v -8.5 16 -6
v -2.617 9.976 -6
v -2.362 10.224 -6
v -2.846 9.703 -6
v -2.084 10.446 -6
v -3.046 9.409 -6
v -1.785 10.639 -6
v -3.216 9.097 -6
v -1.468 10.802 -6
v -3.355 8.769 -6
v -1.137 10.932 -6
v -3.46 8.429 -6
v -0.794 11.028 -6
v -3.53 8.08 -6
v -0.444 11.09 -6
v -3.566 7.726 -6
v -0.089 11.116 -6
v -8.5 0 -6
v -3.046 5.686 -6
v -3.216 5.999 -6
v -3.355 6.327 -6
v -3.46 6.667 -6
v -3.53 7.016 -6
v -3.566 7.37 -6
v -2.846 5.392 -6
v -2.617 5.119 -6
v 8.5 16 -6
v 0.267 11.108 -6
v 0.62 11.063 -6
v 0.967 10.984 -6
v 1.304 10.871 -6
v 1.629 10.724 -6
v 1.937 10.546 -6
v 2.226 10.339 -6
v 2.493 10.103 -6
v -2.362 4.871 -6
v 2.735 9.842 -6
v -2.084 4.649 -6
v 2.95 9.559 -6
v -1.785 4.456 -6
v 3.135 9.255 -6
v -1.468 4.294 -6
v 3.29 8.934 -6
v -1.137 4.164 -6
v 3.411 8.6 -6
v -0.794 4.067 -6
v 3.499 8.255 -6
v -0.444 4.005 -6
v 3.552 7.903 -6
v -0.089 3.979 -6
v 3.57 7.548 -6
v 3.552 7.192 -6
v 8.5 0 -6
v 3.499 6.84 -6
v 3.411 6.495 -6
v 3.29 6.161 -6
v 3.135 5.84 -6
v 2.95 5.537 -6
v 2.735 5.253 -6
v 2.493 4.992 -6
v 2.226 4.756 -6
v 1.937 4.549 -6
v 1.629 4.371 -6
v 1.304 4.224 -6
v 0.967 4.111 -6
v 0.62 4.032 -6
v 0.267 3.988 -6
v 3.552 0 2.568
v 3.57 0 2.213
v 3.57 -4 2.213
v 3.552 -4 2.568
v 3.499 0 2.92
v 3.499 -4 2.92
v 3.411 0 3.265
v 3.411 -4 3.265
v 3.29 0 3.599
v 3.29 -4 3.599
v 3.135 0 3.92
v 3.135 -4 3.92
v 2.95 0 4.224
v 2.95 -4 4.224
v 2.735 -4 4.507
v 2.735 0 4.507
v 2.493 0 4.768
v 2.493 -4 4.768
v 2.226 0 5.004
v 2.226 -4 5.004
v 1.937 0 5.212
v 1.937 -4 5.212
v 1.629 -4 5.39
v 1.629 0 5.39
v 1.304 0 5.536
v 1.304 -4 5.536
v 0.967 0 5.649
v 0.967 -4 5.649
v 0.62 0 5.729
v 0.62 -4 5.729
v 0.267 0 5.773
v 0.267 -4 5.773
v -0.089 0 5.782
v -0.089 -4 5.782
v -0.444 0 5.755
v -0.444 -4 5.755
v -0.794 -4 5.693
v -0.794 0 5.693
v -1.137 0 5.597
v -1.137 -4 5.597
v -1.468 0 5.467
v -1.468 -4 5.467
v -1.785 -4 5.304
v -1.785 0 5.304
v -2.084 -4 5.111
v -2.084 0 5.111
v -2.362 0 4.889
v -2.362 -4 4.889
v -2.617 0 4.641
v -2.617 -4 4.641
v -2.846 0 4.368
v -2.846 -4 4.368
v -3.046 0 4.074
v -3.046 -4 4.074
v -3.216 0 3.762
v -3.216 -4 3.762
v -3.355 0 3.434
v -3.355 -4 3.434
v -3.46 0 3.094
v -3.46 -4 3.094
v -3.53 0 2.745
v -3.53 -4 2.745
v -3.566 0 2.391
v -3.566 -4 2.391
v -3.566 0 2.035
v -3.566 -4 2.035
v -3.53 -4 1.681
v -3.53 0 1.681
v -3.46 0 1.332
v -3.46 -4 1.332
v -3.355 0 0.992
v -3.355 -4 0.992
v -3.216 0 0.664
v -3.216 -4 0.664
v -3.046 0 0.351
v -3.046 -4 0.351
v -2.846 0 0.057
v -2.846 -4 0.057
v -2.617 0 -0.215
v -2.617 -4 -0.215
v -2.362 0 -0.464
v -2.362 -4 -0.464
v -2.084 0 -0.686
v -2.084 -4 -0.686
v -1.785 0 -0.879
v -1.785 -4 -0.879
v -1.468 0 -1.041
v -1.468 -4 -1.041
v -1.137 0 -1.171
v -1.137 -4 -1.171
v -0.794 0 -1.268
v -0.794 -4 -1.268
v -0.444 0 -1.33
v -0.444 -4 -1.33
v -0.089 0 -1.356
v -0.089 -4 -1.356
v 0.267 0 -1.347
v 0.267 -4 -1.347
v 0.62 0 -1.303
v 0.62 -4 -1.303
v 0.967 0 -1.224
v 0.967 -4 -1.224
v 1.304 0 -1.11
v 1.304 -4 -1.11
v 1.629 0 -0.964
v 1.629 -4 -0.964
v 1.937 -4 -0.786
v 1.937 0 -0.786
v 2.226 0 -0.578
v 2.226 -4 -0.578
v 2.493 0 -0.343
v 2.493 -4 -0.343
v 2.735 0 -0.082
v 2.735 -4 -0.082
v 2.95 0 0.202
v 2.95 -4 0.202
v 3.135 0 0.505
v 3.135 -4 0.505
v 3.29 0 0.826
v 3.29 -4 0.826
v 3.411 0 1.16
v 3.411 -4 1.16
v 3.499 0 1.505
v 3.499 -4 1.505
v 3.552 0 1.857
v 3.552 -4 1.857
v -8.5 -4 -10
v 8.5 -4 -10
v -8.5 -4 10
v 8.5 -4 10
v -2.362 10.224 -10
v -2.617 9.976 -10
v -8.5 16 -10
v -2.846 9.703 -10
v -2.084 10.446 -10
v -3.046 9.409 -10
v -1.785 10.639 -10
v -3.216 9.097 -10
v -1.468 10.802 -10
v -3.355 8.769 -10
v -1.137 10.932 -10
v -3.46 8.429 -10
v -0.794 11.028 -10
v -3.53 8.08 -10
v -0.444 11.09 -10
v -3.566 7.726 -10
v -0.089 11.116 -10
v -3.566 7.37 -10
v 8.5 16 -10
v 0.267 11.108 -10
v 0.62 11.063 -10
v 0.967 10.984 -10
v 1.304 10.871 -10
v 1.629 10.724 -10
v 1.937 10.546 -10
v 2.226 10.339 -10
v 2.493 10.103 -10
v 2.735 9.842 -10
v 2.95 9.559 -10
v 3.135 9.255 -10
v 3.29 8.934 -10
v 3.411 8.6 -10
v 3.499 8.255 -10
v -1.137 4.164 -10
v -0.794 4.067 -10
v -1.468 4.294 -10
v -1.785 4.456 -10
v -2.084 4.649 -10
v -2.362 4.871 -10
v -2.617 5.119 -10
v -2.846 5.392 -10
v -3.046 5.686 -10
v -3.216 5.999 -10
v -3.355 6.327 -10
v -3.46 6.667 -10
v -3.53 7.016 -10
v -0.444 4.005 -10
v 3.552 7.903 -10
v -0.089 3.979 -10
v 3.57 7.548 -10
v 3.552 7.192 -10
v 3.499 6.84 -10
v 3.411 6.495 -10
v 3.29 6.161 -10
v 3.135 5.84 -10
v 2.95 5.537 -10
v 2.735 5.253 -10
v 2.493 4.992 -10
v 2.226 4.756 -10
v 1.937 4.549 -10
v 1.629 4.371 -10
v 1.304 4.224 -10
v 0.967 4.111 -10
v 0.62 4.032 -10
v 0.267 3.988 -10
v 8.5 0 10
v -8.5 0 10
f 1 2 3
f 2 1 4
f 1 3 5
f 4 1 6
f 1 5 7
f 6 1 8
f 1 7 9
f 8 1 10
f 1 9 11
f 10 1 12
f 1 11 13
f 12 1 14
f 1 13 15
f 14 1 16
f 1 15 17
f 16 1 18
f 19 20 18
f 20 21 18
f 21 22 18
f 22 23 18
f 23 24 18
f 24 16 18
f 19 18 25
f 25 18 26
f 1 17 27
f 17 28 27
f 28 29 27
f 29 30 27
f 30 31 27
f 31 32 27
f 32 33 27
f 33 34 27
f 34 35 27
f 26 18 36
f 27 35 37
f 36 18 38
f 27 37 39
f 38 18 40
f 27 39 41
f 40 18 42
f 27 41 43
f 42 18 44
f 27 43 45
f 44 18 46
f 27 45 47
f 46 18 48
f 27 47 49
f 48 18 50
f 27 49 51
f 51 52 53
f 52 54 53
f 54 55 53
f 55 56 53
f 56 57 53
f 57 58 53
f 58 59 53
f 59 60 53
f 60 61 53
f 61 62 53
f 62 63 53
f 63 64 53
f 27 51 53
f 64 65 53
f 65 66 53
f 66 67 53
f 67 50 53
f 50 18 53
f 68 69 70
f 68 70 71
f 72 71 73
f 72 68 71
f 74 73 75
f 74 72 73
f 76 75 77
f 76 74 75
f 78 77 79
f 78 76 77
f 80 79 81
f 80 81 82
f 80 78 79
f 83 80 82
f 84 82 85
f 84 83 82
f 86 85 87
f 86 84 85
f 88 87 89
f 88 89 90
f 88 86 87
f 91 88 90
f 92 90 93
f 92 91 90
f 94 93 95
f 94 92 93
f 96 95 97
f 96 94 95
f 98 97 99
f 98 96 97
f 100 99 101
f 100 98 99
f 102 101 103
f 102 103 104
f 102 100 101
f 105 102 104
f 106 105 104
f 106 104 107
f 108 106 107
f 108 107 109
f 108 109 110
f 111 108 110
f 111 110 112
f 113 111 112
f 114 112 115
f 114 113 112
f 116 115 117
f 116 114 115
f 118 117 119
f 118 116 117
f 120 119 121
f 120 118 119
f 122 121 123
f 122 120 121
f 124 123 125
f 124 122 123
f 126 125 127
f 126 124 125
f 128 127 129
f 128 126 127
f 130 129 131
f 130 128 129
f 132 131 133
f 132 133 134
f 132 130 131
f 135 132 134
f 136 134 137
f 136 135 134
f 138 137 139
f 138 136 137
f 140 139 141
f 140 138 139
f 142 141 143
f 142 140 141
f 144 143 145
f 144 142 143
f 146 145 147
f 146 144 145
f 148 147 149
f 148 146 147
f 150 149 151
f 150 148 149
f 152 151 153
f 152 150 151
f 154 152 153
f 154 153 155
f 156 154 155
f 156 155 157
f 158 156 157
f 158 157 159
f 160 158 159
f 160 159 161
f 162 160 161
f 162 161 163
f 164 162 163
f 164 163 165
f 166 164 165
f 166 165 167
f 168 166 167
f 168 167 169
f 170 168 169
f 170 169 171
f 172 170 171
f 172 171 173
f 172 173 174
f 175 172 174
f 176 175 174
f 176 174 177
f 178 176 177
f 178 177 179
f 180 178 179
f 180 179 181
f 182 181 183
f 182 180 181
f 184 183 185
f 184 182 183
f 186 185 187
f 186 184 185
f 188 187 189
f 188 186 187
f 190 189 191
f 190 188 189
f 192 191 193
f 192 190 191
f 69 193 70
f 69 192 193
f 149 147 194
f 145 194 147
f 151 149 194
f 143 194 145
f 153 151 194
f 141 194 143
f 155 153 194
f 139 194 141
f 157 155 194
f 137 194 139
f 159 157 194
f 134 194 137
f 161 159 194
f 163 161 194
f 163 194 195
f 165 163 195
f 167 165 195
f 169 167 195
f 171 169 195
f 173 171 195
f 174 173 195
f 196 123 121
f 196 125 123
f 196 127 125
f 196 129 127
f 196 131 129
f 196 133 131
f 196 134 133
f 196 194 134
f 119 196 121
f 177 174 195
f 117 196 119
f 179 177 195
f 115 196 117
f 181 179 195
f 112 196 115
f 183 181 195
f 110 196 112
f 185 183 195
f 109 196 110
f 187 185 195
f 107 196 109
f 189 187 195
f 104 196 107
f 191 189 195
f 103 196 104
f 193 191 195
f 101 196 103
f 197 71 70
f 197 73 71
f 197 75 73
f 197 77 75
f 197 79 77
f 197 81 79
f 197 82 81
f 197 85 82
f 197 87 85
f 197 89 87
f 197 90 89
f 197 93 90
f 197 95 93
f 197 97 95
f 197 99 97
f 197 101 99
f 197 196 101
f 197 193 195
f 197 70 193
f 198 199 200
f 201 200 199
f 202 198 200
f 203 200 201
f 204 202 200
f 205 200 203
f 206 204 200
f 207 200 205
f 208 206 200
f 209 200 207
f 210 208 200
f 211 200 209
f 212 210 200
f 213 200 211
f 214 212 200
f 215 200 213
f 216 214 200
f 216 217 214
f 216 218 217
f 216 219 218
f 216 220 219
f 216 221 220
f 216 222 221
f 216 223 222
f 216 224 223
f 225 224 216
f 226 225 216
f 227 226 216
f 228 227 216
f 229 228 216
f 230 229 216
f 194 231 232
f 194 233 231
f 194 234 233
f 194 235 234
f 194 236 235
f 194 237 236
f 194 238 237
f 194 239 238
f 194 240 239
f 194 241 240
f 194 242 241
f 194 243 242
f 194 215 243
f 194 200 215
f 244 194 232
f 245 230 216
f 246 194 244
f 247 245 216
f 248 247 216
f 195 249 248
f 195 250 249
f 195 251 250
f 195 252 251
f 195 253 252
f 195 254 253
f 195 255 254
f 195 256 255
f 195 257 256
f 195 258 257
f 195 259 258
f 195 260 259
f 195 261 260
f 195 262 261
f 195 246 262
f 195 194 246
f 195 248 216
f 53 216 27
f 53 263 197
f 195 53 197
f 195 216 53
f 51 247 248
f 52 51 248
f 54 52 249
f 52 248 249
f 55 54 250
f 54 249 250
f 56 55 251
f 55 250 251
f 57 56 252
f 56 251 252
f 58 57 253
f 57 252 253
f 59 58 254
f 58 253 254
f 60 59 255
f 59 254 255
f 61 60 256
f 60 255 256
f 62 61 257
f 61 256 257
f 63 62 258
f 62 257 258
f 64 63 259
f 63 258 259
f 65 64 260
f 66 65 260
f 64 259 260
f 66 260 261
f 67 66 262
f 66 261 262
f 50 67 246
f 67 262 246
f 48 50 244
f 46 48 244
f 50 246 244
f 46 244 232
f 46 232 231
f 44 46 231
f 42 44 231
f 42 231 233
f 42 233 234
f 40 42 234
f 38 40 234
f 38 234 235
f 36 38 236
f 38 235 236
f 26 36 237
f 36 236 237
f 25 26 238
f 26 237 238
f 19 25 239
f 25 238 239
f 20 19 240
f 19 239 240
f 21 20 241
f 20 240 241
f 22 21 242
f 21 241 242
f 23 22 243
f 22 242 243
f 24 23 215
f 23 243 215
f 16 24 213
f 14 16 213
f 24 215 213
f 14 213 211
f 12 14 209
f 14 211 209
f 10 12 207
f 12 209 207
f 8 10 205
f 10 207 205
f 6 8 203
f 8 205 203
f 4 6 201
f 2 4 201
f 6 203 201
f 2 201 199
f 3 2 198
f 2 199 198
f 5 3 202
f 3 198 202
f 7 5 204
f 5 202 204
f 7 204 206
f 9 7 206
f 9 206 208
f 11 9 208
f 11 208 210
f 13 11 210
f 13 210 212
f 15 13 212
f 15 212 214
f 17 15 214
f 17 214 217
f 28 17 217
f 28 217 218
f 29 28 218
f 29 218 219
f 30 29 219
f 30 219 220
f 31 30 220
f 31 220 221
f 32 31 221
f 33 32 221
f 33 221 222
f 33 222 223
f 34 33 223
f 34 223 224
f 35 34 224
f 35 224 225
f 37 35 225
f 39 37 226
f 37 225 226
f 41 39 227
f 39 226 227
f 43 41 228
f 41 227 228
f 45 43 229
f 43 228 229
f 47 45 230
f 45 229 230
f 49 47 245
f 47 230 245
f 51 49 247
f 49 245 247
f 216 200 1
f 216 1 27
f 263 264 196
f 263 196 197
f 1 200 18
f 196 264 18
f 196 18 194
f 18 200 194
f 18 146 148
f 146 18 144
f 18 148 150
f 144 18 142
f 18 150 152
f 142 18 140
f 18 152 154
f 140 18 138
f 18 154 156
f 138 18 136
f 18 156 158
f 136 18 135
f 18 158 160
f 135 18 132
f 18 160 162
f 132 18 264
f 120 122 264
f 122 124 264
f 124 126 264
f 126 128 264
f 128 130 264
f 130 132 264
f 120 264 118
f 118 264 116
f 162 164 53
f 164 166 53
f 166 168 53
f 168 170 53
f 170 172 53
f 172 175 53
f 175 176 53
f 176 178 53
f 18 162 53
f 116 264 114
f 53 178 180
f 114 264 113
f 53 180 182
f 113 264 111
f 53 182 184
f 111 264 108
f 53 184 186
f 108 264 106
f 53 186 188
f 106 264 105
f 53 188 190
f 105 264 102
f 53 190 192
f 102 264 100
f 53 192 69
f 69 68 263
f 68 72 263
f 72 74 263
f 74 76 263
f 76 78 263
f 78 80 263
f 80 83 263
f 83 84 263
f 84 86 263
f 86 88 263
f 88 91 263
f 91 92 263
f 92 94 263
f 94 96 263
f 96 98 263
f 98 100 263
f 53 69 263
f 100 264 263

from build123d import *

# Parameters (mm, degrees)
F0_W     = 17
F0_H     = 20
F0_R     = 3.57
F1_DEPTH = 4
F2_W     = 17
F2_H     = 16
F2_R     = 3.57
F3_DEPTH = 4


with BuildPart() as f1:
    # F0 (on Front) → F1 (new body)
    with BuildSketch(Plane.XZ):
        Rectangle(F0_W, F0_H)
        with Locations((0, 2.212742)):
            Circle(F0_R, mode=Mode.SUBTRACT)
    extrude(amount=F1_DEPTH)

    # F2 (on face) → F3 (join)
    with BuildSketch(Plane(origin=(0, 0, -10), x_dir=(1, 0, 0), z_dir=(0, 0, -1))):
        with Locations((0, -8)):
            Rectangle(F2_W, F2_H)
        with Locations((0, -7.547601)):
            Circle(F2_R, mode=Mode.SUBTRACT)
    extrude(amount=-F3_DEPTH)


solid = f1.part
